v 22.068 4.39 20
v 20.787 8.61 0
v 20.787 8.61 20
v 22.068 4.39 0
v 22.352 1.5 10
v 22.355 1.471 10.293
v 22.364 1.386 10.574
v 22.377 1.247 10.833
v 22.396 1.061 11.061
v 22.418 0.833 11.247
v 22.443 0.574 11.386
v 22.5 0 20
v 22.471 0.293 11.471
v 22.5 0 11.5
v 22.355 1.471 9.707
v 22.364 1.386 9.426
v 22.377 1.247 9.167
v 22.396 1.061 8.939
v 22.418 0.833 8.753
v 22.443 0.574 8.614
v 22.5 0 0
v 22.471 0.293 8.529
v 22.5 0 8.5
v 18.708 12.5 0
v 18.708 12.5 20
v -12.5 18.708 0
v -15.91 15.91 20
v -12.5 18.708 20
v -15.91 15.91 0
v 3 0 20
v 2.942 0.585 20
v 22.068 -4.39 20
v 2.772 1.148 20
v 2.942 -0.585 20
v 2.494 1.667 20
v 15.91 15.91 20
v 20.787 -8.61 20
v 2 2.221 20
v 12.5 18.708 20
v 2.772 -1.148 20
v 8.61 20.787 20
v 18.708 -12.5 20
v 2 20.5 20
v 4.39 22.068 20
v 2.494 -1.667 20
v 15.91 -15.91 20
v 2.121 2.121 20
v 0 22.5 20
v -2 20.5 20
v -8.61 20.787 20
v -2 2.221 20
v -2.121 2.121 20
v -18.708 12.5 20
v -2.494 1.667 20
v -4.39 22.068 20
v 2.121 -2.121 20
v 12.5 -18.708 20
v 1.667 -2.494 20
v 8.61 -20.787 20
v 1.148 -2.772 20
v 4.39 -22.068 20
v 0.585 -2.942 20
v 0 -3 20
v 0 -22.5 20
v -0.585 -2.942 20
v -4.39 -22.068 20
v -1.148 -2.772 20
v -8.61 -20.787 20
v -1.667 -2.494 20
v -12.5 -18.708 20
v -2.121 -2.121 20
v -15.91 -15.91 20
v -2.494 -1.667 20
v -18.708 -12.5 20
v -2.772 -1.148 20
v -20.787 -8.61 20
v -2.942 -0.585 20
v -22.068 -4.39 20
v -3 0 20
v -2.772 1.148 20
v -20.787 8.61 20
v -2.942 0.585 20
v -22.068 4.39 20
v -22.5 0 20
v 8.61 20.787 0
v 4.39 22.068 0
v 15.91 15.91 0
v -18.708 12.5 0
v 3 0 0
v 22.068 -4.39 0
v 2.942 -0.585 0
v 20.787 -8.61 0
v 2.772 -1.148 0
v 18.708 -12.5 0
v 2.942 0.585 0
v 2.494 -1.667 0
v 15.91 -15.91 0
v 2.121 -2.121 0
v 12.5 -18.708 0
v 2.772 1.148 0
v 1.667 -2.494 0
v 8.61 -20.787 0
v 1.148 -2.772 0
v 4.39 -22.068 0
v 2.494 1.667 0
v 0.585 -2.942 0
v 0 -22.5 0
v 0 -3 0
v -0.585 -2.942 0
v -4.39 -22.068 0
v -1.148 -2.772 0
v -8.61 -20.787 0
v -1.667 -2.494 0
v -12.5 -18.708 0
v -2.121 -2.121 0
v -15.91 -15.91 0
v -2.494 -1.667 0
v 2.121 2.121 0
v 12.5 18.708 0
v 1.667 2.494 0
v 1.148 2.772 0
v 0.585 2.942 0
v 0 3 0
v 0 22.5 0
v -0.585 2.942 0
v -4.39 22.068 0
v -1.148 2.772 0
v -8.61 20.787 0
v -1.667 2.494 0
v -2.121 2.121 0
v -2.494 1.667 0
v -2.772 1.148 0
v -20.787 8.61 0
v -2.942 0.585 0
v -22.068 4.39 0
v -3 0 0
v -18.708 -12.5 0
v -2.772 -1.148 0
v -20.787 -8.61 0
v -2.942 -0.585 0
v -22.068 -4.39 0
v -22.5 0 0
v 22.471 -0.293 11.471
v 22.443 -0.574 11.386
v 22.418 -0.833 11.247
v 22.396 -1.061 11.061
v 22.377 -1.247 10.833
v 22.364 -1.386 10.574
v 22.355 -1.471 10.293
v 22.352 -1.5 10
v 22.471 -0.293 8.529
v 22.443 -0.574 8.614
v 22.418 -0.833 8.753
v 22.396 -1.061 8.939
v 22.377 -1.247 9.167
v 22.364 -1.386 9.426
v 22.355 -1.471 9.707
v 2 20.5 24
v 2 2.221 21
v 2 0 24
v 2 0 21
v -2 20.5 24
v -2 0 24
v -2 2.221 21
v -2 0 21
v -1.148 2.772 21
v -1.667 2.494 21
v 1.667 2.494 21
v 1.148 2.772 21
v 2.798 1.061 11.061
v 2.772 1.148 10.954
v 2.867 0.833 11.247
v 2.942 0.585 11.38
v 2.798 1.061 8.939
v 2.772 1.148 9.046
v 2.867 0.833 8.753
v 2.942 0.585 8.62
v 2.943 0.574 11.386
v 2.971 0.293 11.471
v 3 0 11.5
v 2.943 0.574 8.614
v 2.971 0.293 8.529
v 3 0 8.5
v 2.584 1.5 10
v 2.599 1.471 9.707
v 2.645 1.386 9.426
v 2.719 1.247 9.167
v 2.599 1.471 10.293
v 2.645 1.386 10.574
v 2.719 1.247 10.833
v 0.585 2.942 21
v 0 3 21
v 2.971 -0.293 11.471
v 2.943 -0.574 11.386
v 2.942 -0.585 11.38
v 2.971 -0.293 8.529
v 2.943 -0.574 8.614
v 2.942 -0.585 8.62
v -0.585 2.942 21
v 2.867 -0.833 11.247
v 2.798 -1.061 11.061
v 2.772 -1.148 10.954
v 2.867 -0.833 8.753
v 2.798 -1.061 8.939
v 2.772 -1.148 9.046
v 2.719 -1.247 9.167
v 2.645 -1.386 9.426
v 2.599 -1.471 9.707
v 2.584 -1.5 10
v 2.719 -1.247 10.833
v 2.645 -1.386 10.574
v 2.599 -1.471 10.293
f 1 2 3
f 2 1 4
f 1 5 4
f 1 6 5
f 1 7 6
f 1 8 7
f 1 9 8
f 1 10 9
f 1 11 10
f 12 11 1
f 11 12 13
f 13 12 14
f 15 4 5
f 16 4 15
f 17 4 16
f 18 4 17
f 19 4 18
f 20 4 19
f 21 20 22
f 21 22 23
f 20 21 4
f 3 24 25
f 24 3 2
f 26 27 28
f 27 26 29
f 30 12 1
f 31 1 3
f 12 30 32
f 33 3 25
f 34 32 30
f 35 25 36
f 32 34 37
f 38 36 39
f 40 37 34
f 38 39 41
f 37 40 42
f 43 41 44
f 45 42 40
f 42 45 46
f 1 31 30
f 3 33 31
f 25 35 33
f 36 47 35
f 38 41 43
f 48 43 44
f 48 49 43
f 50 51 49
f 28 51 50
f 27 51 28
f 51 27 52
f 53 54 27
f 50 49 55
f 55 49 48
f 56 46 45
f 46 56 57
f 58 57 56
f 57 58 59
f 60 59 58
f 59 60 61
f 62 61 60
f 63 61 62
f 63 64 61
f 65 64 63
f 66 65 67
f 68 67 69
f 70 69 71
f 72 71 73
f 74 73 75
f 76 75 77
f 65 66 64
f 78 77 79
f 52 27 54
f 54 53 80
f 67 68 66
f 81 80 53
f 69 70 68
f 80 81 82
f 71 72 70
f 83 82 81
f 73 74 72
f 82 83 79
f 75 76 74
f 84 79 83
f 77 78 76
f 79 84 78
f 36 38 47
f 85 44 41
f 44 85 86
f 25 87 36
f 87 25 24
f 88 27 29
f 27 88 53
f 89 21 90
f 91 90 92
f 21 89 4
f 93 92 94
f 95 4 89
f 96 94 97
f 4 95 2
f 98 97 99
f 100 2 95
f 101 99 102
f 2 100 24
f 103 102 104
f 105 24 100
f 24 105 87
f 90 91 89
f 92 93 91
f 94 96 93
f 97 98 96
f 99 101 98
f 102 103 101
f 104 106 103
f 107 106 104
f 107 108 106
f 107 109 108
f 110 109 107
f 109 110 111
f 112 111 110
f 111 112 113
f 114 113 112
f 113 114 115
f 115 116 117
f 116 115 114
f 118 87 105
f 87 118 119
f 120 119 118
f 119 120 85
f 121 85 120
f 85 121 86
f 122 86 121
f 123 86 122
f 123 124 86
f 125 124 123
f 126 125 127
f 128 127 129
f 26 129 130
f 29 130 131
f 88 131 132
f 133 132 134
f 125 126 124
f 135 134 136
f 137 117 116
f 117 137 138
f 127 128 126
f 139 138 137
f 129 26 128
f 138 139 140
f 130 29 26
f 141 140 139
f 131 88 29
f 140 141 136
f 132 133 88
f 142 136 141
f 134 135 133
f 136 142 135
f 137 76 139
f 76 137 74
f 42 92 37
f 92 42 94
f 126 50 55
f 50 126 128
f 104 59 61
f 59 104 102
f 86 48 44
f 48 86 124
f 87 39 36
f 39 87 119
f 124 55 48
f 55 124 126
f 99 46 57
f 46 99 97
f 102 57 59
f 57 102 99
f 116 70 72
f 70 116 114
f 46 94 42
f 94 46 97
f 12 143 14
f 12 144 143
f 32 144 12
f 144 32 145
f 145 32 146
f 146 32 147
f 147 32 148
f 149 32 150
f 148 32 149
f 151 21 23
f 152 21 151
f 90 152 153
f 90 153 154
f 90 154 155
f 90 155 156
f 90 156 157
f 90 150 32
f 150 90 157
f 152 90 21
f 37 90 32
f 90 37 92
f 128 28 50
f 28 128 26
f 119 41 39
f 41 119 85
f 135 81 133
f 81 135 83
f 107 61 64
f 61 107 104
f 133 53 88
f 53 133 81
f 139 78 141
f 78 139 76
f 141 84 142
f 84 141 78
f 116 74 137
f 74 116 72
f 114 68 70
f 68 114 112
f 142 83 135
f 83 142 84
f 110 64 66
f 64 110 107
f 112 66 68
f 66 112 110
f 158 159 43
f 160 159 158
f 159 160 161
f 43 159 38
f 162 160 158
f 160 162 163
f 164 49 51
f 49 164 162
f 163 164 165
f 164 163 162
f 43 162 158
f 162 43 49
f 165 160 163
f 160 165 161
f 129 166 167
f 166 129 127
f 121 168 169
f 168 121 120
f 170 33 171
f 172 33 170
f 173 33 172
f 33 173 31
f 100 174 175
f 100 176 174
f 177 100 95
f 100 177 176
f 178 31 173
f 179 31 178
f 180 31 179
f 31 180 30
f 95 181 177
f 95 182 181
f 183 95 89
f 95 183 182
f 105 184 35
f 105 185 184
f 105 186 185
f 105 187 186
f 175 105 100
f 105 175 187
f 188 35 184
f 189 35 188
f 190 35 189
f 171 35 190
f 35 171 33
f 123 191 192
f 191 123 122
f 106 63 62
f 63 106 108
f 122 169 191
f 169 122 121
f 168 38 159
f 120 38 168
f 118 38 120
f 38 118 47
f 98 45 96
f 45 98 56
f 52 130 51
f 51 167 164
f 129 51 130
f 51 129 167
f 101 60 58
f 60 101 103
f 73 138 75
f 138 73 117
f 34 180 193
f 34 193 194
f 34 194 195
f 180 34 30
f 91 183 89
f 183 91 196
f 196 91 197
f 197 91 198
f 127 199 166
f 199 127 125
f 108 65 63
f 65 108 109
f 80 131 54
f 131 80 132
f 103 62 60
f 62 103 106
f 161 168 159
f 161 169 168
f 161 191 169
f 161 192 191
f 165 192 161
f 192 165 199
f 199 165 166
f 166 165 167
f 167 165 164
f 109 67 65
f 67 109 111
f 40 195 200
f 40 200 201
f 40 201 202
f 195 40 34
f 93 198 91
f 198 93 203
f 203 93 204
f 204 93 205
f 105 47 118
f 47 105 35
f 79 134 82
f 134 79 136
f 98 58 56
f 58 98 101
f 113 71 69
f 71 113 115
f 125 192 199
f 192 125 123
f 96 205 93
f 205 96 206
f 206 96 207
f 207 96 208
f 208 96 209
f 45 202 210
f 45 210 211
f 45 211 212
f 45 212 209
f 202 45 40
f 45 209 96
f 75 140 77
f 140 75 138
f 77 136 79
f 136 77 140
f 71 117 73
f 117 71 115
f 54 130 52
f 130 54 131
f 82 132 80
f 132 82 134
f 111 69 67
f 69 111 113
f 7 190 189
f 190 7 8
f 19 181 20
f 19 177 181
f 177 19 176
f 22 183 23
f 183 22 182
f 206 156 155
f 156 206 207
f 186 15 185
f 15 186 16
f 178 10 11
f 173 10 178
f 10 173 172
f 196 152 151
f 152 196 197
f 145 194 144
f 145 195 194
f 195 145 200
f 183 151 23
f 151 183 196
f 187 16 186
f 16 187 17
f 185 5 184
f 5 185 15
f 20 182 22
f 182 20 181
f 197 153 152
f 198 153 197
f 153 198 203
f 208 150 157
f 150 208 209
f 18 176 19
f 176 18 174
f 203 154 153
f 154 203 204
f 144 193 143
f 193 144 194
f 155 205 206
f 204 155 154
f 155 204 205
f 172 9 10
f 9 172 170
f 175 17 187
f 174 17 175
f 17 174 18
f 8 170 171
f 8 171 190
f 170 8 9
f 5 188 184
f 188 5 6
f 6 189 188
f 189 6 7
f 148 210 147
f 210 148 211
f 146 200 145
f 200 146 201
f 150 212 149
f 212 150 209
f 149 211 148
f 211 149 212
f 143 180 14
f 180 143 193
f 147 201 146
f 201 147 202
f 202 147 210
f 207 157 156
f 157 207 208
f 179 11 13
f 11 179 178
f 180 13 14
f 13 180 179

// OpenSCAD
$fn = 32;

// ----------------------------------------------------------------------
// Control knob: pointer knob
// ----------------------------------------------------------------------

// --- parameters (mm) ---
rib_w = 4;                // pointer rib width
rib_h = 5;                // pointer rib height
knob_d = 45;              // knob body diameter
knob_h = 20;              // knob body height
bore_d = 6;               // shaft bore diameter
set_d = 3;                // set screw bore diameter
fit_tol = 0.02;           // tolerance for press fits, mm
free_tol = 0.2;           // tolerance for clearance fits, mm

rib_poke = rib_h - 1;  // rib height above the top
total_h = knob_h + rib_h - 1;  // overall height

difference() {
  union() {
    cylinder(h = knob_h, d = knob_d);
    translate([-rib_w / 2, 0, knob_h - 1])
      cube([rib_w, knob_d / 2 - 2, rib_h]);
  }
  translate([0, 0, -1]) cylinder(h = knob_h + 2, d = bore_d);
  translate([-1, 0, knob_h / 2]) rotate([0, 90, 0])
    cylinder(h = knob_d / 2 + bore_d / 2 + 2, d = set_d);}
